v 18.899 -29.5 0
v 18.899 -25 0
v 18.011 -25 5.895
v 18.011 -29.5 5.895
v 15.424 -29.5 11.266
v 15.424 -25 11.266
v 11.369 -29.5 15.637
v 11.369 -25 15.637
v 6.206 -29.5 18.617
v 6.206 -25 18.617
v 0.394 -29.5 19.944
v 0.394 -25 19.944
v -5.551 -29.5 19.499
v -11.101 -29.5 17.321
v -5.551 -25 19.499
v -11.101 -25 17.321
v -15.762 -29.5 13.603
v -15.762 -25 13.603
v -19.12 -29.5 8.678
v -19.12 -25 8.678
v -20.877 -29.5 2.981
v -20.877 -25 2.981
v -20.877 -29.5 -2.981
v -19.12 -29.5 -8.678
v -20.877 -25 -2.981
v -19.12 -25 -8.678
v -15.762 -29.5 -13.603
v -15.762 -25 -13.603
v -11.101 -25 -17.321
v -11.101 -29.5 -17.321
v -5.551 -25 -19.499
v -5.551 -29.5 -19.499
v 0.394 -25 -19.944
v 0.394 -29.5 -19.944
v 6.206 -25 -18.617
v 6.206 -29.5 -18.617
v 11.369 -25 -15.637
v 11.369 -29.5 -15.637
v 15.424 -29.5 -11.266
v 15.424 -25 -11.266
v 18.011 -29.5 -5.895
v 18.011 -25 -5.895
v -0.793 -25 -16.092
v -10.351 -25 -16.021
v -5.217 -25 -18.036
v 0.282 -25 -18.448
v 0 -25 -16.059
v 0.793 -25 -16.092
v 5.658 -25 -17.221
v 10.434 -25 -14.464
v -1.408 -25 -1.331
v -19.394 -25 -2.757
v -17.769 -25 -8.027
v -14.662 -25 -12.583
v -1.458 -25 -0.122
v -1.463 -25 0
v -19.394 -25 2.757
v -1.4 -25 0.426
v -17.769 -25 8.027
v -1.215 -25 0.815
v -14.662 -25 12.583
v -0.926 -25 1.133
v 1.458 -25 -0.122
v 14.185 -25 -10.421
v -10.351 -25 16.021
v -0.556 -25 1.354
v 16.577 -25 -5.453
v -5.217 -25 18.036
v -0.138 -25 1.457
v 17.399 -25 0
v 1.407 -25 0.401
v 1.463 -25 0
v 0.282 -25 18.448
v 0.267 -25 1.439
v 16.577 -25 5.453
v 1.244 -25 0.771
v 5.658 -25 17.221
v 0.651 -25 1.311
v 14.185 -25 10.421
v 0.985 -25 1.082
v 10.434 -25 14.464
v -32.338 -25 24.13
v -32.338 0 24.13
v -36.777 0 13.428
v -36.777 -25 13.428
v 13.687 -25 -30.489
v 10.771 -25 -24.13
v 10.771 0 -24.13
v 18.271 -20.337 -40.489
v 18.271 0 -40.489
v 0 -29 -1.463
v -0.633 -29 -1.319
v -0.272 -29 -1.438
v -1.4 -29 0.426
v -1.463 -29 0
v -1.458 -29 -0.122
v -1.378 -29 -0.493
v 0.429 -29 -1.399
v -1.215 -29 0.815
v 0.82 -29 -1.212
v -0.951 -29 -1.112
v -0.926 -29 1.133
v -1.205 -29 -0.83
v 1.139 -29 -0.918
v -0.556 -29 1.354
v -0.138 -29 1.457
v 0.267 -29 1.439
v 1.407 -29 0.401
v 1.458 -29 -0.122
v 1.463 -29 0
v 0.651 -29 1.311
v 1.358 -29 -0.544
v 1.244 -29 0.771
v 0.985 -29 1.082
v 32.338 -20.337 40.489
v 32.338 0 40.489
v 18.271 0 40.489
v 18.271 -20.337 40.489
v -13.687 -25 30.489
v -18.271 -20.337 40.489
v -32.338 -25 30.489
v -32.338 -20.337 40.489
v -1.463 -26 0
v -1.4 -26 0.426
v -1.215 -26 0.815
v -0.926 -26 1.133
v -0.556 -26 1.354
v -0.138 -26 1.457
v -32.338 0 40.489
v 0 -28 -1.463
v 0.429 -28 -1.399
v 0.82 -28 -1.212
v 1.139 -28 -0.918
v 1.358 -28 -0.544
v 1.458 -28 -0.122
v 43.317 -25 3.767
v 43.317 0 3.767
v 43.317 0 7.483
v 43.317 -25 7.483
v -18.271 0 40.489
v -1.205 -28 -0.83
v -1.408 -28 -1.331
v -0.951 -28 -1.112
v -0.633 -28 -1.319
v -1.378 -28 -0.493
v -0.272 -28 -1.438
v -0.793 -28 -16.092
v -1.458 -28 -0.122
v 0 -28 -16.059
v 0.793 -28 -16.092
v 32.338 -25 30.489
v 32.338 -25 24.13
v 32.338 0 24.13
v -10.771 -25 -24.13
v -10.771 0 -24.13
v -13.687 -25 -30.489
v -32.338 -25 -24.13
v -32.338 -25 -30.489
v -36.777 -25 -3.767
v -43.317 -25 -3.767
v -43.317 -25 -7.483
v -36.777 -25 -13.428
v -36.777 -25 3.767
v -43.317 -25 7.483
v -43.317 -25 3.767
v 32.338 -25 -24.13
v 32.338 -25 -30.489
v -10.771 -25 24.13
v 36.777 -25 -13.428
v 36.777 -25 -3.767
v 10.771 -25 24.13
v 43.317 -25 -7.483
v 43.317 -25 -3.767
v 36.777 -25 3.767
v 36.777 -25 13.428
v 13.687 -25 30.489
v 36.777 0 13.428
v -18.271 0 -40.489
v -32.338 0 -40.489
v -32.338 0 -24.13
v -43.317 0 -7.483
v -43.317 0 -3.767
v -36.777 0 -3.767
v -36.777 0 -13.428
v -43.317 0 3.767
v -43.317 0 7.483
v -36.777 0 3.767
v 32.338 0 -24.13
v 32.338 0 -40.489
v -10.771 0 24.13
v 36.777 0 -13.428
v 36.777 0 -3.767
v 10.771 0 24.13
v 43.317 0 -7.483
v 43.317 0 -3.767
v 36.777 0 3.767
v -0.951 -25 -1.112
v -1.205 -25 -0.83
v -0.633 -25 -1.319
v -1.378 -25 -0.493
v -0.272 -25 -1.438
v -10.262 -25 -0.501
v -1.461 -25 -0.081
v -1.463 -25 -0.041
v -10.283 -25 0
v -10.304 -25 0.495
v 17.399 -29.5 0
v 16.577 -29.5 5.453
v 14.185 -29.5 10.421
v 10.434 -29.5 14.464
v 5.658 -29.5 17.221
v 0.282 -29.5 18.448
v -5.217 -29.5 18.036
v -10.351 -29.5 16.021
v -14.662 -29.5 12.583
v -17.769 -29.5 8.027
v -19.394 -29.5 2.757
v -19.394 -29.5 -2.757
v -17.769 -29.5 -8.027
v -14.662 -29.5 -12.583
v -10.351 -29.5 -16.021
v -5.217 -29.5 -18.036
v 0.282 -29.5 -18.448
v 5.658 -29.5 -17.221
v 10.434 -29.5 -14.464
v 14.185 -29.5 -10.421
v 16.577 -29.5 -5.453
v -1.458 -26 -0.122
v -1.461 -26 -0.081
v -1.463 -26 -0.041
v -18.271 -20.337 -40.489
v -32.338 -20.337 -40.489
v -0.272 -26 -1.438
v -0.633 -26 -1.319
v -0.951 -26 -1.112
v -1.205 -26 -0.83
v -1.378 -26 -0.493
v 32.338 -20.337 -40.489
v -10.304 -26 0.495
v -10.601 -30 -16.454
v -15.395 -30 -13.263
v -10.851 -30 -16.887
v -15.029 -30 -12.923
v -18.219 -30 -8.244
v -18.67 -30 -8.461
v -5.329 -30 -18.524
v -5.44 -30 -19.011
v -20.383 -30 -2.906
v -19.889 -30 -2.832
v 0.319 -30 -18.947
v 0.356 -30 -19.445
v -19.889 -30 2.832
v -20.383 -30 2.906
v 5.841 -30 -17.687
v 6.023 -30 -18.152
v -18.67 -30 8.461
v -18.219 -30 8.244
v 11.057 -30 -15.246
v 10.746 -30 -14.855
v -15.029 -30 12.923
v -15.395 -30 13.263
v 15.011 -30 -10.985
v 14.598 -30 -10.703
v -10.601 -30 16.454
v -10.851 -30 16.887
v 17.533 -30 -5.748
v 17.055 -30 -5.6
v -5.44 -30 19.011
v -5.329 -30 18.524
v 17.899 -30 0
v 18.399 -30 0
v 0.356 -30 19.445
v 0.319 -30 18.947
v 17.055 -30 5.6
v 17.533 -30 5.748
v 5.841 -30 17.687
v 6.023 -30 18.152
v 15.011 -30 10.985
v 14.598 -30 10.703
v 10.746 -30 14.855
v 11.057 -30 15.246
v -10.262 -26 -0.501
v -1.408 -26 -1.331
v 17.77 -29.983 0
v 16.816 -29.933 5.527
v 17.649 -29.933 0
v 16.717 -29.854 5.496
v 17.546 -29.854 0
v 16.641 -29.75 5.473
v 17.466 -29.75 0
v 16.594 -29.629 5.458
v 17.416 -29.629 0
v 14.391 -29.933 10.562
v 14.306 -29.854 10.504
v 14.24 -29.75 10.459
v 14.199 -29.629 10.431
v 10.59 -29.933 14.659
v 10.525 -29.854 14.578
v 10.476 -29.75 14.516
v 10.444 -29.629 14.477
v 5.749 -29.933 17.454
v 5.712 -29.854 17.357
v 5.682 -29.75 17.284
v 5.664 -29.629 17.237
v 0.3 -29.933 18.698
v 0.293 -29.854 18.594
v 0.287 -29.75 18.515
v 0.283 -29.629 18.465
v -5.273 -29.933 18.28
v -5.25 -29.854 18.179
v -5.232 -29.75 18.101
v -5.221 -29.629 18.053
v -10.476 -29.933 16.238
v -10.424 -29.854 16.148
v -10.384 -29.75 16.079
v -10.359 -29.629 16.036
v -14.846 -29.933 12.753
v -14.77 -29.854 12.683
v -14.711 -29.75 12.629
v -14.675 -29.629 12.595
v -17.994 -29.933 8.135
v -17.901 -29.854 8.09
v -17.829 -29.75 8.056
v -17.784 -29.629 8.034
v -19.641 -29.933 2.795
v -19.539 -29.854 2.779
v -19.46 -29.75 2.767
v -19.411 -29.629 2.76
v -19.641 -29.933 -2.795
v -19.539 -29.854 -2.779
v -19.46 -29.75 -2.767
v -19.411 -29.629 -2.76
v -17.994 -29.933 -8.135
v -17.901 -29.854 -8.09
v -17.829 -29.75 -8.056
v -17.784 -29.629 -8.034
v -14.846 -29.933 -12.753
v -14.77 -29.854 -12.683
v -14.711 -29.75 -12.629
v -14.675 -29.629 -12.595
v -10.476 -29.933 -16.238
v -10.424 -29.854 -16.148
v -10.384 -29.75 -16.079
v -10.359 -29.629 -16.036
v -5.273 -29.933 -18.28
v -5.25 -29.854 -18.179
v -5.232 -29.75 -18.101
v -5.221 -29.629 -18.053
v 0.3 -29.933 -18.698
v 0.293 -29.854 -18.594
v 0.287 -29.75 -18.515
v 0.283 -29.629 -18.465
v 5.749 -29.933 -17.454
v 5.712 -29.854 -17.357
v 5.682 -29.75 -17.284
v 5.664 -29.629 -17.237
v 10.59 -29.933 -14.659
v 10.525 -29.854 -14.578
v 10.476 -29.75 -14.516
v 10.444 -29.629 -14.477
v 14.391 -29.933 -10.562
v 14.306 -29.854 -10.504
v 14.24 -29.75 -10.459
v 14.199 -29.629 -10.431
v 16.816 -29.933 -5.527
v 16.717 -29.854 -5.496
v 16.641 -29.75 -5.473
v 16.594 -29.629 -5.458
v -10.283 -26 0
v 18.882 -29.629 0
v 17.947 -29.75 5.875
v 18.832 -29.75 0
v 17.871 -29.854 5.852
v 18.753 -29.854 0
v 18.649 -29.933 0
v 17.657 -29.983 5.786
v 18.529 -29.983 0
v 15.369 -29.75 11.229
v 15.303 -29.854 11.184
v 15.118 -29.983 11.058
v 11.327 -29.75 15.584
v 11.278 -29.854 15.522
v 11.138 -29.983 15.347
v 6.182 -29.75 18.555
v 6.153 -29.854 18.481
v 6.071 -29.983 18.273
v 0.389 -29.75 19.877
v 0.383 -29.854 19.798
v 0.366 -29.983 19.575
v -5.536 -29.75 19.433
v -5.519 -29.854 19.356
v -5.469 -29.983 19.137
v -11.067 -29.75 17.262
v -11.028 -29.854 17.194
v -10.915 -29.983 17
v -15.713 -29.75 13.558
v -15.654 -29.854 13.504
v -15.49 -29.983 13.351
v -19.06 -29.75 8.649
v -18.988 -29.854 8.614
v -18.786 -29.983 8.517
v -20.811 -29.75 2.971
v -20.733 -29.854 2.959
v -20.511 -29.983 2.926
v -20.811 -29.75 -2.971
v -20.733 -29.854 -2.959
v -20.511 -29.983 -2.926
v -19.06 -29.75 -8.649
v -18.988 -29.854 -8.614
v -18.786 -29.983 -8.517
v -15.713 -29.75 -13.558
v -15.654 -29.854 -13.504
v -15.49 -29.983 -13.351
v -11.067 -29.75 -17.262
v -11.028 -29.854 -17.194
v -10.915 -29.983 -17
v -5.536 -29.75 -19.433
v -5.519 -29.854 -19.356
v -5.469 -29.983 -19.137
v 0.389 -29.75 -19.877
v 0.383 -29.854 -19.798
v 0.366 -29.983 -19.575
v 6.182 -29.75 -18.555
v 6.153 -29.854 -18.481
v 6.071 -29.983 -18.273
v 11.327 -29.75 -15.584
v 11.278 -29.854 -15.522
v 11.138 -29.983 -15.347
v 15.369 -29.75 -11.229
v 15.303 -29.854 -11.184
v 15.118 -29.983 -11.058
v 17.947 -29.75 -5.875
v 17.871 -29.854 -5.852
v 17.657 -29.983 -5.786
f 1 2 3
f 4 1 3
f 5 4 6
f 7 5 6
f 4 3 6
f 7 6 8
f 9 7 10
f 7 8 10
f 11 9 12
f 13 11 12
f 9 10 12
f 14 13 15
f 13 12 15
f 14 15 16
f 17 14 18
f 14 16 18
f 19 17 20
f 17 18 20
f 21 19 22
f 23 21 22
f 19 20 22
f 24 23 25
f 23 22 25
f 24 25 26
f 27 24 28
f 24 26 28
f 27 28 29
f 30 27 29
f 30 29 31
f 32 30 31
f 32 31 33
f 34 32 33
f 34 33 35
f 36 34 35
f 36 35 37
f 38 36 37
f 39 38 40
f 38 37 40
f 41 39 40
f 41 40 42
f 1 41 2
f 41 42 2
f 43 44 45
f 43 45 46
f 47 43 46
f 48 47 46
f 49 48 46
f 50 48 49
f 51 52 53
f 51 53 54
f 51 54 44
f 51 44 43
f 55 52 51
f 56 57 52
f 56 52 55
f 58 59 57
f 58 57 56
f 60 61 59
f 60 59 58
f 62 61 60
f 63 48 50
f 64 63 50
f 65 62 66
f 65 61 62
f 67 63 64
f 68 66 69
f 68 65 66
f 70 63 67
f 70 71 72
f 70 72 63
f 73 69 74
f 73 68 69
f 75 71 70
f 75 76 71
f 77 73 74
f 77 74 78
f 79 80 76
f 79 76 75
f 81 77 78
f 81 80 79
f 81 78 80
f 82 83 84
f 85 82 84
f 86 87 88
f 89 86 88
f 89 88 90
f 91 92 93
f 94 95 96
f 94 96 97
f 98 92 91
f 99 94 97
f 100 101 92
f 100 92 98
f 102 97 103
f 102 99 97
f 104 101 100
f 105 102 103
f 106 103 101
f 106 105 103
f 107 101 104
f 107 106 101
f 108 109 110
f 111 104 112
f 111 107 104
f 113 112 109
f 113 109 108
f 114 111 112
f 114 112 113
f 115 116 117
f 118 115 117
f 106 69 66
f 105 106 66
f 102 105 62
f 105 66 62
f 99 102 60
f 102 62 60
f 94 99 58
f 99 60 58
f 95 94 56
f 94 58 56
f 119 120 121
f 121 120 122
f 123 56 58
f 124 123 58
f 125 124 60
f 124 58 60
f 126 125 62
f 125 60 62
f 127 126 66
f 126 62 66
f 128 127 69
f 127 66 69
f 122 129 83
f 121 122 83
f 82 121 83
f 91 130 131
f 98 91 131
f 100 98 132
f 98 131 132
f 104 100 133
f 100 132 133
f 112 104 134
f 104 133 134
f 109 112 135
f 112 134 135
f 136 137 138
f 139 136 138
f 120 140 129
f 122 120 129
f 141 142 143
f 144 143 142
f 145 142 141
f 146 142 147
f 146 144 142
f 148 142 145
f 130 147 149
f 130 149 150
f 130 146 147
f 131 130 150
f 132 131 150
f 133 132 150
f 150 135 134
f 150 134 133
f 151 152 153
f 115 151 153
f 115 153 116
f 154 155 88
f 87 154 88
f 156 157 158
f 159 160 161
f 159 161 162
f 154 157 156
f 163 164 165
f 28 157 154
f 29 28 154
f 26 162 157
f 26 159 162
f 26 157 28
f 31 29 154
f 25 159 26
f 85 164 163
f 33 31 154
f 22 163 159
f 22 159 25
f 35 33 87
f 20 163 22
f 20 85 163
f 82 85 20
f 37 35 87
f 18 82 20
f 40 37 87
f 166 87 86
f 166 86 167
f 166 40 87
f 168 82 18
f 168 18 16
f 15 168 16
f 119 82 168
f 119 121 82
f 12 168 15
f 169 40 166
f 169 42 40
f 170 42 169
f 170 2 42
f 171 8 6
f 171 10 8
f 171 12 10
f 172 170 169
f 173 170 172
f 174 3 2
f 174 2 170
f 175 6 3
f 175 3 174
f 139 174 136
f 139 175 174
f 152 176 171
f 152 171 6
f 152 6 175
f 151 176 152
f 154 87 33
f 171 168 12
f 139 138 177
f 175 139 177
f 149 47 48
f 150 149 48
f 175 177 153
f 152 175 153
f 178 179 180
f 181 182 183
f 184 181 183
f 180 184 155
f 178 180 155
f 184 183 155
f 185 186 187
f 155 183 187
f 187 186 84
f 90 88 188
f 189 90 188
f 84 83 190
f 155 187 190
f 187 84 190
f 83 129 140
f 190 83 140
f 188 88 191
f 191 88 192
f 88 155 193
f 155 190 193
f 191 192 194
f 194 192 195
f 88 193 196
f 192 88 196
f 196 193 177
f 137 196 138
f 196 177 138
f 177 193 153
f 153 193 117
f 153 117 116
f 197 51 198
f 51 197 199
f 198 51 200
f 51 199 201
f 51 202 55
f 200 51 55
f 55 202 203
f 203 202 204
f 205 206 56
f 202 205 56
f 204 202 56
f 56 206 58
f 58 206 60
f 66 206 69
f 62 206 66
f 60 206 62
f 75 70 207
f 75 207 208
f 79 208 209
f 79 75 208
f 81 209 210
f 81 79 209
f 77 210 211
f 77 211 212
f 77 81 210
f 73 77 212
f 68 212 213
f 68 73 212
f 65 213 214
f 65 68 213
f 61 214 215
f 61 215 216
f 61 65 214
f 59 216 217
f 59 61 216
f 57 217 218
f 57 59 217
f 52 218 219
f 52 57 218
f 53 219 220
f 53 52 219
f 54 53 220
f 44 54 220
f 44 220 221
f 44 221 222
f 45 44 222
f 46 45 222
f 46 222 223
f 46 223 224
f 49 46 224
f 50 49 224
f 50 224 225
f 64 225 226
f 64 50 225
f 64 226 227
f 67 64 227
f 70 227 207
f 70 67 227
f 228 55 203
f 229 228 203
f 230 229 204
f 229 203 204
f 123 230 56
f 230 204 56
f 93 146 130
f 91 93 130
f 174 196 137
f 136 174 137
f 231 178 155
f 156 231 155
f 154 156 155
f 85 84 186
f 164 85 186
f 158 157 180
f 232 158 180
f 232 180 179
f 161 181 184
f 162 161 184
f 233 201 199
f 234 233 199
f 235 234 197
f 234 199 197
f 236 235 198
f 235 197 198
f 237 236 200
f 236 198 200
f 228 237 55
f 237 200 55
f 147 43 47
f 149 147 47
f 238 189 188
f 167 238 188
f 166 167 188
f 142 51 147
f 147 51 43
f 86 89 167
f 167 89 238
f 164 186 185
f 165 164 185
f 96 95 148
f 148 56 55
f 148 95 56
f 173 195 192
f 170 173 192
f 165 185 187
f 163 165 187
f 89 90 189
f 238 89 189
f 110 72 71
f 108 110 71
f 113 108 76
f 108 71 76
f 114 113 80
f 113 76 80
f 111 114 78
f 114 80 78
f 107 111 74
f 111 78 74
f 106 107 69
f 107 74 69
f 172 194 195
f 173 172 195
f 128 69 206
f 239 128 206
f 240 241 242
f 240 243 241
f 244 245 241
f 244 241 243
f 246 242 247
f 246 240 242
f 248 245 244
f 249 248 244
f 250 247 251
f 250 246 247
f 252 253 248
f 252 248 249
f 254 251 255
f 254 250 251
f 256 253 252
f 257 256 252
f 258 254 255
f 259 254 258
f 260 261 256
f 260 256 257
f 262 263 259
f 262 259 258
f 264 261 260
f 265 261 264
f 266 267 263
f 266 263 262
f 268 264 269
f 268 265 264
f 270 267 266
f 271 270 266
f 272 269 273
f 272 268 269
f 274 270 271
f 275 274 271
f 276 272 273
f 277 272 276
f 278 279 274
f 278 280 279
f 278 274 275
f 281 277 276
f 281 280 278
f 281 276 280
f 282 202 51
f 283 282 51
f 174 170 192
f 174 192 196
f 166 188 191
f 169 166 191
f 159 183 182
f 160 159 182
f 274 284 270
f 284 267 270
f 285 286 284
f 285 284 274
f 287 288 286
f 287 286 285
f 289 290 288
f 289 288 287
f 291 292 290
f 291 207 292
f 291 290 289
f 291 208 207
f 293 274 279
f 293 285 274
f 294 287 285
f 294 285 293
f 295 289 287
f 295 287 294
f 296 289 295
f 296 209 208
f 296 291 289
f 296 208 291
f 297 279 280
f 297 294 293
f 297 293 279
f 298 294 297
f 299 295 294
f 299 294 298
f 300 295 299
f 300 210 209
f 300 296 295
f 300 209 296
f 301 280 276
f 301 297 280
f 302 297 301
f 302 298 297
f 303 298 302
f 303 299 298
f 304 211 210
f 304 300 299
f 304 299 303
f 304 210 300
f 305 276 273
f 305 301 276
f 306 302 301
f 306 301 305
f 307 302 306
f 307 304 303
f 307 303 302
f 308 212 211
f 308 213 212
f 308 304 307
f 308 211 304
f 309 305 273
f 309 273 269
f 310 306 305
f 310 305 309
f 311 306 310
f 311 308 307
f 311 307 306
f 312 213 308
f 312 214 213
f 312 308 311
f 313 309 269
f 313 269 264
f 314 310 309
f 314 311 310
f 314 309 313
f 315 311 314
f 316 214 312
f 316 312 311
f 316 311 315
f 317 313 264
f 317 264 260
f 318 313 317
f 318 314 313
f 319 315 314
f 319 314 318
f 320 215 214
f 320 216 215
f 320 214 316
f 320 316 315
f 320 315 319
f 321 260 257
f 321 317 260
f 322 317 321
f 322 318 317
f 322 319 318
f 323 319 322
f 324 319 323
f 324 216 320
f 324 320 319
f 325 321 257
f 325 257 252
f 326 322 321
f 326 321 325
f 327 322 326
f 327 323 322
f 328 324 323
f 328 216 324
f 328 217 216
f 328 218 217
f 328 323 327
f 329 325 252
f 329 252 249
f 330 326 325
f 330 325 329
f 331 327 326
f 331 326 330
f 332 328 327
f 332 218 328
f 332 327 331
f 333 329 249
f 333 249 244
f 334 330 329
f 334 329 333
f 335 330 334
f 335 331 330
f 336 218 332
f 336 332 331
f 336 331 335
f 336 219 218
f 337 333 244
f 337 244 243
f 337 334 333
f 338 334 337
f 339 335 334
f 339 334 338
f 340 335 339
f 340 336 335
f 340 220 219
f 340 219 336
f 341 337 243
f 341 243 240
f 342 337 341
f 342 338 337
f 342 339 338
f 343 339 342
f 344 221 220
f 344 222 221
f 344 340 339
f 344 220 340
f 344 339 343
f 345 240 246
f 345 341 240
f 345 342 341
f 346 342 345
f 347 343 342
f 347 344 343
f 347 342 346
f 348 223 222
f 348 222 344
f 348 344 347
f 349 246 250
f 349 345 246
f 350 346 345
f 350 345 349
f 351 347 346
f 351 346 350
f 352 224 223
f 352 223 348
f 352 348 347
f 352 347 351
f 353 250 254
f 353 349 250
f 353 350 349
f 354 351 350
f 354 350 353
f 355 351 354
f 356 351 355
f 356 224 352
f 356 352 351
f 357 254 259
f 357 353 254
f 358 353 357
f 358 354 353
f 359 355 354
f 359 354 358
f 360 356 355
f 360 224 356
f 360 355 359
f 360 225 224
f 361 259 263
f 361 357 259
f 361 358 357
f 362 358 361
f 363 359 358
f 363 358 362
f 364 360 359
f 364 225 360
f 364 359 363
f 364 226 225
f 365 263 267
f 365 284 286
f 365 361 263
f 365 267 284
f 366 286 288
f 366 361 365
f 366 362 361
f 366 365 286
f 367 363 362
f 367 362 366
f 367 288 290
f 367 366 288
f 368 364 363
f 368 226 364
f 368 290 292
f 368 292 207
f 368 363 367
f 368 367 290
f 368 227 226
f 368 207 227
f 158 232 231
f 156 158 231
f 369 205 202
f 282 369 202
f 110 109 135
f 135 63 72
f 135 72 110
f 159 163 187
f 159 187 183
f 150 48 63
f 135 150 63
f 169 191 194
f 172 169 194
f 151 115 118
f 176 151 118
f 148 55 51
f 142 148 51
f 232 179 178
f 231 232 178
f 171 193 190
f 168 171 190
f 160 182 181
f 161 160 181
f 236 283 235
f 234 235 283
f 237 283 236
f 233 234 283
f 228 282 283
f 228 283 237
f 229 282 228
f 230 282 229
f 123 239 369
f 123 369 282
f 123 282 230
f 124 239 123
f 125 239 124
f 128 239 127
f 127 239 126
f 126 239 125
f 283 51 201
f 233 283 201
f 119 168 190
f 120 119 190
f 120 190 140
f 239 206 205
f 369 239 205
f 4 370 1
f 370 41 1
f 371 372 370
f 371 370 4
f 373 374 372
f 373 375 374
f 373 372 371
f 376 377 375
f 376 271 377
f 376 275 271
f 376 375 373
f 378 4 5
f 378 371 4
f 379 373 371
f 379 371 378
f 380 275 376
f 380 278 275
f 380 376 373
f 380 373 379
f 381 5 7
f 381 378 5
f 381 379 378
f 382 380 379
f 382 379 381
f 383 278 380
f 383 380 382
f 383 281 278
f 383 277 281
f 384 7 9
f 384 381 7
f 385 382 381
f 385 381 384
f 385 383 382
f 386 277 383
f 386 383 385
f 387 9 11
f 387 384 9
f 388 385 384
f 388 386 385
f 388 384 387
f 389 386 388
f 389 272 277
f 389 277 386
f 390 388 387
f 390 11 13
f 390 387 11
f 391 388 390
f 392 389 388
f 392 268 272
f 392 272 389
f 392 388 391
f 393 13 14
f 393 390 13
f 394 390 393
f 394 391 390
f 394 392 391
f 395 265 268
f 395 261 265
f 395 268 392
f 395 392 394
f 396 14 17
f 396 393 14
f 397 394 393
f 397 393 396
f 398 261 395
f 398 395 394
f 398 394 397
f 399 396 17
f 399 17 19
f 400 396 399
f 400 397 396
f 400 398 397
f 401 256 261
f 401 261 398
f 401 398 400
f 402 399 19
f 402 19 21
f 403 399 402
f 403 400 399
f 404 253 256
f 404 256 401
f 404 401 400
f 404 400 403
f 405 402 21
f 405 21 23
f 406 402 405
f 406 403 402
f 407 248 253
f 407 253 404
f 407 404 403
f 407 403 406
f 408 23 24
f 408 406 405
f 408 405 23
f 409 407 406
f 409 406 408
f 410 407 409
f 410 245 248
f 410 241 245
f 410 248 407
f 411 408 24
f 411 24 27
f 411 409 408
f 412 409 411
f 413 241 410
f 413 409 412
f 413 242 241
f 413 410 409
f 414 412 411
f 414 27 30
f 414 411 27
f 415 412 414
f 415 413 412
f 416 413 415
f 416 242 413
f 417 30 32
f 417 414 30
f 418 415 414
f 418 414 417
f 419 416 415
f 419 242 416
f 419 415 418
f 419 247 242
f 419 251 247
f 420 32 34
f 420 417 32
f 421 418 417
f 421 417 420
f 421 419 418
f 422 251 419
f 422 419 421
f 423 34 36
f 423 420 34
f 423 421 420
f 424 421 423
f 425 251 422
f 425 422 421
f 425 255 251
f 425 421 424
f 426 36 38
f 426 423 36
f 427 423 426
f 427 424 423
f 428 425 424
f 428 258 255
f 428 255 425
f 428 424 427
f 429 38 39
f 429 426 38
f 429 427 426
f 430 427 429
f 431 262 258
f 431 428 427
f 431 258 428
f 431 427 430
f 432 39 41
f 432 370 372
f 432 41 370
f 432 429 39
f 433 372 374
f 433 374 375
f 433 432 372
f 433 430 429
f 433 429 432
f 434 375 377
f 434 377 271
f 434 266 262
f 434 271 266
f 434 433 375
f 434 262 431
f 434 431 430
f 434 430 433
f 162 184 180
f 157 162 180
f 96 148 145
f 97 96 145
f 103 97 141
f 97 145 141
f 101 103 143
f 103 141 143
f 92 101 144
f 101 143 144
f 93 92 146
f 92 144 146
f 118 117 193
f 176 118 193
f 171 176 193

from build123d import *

# Parameters (mm, degrees)
F1_DEPTH = 25
F2_SIZE2 = 4.6630765815
F2_SIZE  = 10
F3_R     = 20
F3_R_2   = 18.5
F4_DEPTH = 5
F5_R     = 0.5
F7_DEPTH = 3
F8_DEPTH = 4
F9_DEPTH = 1


with BuildPart() as f1:
    # F0 (on Front) → F1 (new body)
    with BuildSketch(Plane.XZ):
        Polygon((-10.7714766636, 24.1296291351), (-32.3379188776, 24.1296291351), (-32.3379188776, -24.1296291351), (-10.7714766636, -24.1296291351), (10.7714766636, -24.1296291351), (32.3379188776, -24.1296291351), (32.3379188776, 24.1296291351), (10.7714766636, 24.1296291351), align=None)
        Polygon((-10.7714766636, -24.1296291351), (-32.3379188776, -24.1296291351), (-32.3379188776, -40.4889471829), (-18.2706620544, -40.4889471829), align=None)
        Polygon((32.3379188776, -24.1296291351), (10.7714766636, -24.1296291351), (18.2706620544, -40.4889471829), (32.3379188776, -40.4889471829), align=None)
        Polygon((36.7772430182, 13.4279271588), (32.3379188776, 24.1296291351), (32.3379188776, -24.1296291351), (36.7772430182, -13.4279271588), (43.317168951, -7.4825375341), (43.317168951, -3.7666687276), (36.7772430182, -3.7666687276), (36.7772430182, 3.7666687276), (43.317168951, 3.7666687276), (43.317168951, 7.4825375341), align=None)
        Polygon((18.2706620544, 40.4889471829), (10.7714766636, 24.1296291351), (32.3379188776, 24.1296291351), (32.3379188776, 40.4889471829), align=None)
        Polygon((-32.3379188776, 40.4889471829), (-32.3379188776, 24.1296291351), (-10.7714766636, 24.1296291351), (-18.2706620544, 40.4889471829), align=None)
        Polygon((-32.3379188776, -24.1296291351), (-32.3379188776, 24.1296291351), (-36.7772430182, 13.4279271588), (-43.317168951, 7.4825375341), (-43.317168951, 3.7666687276), (-36.7772430182, 3.7666687276), (-36.7772430182, -3.7666687276), (-43.317168951, -3.7666687276), (-43.317168951, -7.4825375341), (-36.7772430182, -13.4279271588), align=None)
    extrude(amount=F1_DEPTH)

    # F2
    f2_edges = [f1.edges().sort_by_distance(p)[0] for p in [
        (-25.30429, -25, -40.488947),
        (25.30429, -25, -40.488947),
        (25.30429, -25, 40.488947),
        (-25.30429, -25, 40.488947),
    ]]
    f2_side = f1.faces().sort_by_distance((0, -25, 0))[0]
    chamfer(f2_edges, length=F2_SIZE, length2=F2_SIZE2, reference=f2_side)

    # F3 (on face) → F4 (join)
    with BuildSketch(Plane.XZ.offset(25)):
        with Locations((-1.1007853685, 0)):
            Circle(F3_R)
        with Locations((-1.1007853685, 0)):
            Circle(F3_R_2, mode=Mode.SUBTRACT)
    extrude(amount=F4_DEPTH)

    # F5
    f5_edges = [f1.edges().sort_by_distance(p)[0] for p in [
        (-21.100785, -30, 0),
        (-19.600785, -30, 0),
    ]]
    fillet(f5_edges, radius=F5_R)

    # F6 (on face) → F7 (join)
    with BuildSketch(Plane.XZ.offset(25)):
        with BuildLine():
            Line((0.7930111024, -16.0924680531), (1.4582137539, -0.1216838649))
            ThreePointArc((1.4582137539, -0.1216838649), (0.9907412633, -1.0768593521), (0, -1.4632820354))
            ThreePointArc((0, -1.4632820354), (-0.1366349733, -1.4568888767), (-0.2720760154, -1.4377652649))
            Line((-0.2720760154, -1.4377652649), (-1.407833944, -1.3312477008))
            Line((-1.407833944, -1.3312477008), (-0.7930111024, -16.0924680531))
            Line((-0.7930111024, -16.0924680531), (0, -16.0594381729))
            Line((0, -16.0594381729), (0.7930111024, -16.0924680531))
        make_face()
        with BuildLine():
            ThreePointArc((-0.2720760154, -1.4377652649), (-0.1366349733, -1.4568888767), (0, -1.4632820354))
            Line((0, -1.4632820354), (-0.2720760154, -1.4377652649))
        make_face()
        with BuildLine():
            ThreePointArc((-0.2720760154, -1.4377652649), (-1.0869651486, -0.9796433436), (-1.4582137539, -0.1216838649))
            Line((-1.4582137539, -0.1216838649), (-1.407833944, -1.3312477008))
            Line((-1.407833944, -1.3312477008), (-0.2720760154, -1.4377652649))
        make_face()
    extrude(amount=F7_DEPTH)

    # F6 (on face) → F8 (join)
    with BuildSketch(Plane.XZ.offset(25)):
        with BuildLine():
            Line((1.4582137539, -0.1216838649), (1.4632820354, 0))
            ThreePointArc((1.4632820354, 0), (0.9847877966, 1.0823064772), (-0.1377590249, 1.4567830195))
            ThreePointArc((-0.1377590249, 1.4567830195), (-1.0823064772, 0.9847877966), (-1.4632820354, 0))
            Line((-1.4632820354, 0), (-1.4582137539, -0.1216838649))
            ThreePointArc((-1.4582137539, -0.1216838649), (-1.0869651486, -0.9796433436), (-0.2720760154, -1.4377652649))
            Line((-0.2720760154, -1.4377652649), (0, -1.4632820354))
            ThreePointArc((0, -1.4632820354), (0.9907412633, -1.0768593521), (1.4582137539, -0.1216838649))
        make_face()
    extrude(amount=F8_DEPTH)


with BuildPart() as f9:
    # F6 (on face) → F9 (new body)
    with BuildSketch(Plane.XZ.offset(25)):
        with BuildLine():
            ThreePointArc((-1.4632820354, 0), (-1.0823064772, 0.9847877966), (-0.1377590249, 1.4567830195))
            Line((-0.1377590249, 1.4567830195), (-10.3039735789, 0.4954265713))
            Line((-10.3039735789, 0.4954265713), (-10.2833384576, 0))
            Line((-10.2833384576, 0), (-10.2624790743, -0.5008108565))
            Line((-10.2624790743, -0.5008108565), (-1.407833944, -1.3312477008))
            Line((-1.407833944, -1.3312477008), (-1.4582137539, -0.1216838649))
            ThreePointArc((-1.4582137539, -0.1216838649), (-1.4620144159, -0.0608946846), (-1.4632820354, 0))
        make_face()
        with BuildLine():
            ThreePointArc((-0.2720760154, -1.4377652649), (-1.0869651486, -0.9796433436), (-1.4582137539, -0.1216838649))
            Line((-1.4582137539, -0.1216838649), (-1.407833944, -1.3312477008))
            Line((-1.407833944, -1.3312477008), (-0.2720760154, -1.4377652649))
        make_face()
    extrude(amount=F9_DEPTH)


solid = Compound([f1.part, f9.part])
